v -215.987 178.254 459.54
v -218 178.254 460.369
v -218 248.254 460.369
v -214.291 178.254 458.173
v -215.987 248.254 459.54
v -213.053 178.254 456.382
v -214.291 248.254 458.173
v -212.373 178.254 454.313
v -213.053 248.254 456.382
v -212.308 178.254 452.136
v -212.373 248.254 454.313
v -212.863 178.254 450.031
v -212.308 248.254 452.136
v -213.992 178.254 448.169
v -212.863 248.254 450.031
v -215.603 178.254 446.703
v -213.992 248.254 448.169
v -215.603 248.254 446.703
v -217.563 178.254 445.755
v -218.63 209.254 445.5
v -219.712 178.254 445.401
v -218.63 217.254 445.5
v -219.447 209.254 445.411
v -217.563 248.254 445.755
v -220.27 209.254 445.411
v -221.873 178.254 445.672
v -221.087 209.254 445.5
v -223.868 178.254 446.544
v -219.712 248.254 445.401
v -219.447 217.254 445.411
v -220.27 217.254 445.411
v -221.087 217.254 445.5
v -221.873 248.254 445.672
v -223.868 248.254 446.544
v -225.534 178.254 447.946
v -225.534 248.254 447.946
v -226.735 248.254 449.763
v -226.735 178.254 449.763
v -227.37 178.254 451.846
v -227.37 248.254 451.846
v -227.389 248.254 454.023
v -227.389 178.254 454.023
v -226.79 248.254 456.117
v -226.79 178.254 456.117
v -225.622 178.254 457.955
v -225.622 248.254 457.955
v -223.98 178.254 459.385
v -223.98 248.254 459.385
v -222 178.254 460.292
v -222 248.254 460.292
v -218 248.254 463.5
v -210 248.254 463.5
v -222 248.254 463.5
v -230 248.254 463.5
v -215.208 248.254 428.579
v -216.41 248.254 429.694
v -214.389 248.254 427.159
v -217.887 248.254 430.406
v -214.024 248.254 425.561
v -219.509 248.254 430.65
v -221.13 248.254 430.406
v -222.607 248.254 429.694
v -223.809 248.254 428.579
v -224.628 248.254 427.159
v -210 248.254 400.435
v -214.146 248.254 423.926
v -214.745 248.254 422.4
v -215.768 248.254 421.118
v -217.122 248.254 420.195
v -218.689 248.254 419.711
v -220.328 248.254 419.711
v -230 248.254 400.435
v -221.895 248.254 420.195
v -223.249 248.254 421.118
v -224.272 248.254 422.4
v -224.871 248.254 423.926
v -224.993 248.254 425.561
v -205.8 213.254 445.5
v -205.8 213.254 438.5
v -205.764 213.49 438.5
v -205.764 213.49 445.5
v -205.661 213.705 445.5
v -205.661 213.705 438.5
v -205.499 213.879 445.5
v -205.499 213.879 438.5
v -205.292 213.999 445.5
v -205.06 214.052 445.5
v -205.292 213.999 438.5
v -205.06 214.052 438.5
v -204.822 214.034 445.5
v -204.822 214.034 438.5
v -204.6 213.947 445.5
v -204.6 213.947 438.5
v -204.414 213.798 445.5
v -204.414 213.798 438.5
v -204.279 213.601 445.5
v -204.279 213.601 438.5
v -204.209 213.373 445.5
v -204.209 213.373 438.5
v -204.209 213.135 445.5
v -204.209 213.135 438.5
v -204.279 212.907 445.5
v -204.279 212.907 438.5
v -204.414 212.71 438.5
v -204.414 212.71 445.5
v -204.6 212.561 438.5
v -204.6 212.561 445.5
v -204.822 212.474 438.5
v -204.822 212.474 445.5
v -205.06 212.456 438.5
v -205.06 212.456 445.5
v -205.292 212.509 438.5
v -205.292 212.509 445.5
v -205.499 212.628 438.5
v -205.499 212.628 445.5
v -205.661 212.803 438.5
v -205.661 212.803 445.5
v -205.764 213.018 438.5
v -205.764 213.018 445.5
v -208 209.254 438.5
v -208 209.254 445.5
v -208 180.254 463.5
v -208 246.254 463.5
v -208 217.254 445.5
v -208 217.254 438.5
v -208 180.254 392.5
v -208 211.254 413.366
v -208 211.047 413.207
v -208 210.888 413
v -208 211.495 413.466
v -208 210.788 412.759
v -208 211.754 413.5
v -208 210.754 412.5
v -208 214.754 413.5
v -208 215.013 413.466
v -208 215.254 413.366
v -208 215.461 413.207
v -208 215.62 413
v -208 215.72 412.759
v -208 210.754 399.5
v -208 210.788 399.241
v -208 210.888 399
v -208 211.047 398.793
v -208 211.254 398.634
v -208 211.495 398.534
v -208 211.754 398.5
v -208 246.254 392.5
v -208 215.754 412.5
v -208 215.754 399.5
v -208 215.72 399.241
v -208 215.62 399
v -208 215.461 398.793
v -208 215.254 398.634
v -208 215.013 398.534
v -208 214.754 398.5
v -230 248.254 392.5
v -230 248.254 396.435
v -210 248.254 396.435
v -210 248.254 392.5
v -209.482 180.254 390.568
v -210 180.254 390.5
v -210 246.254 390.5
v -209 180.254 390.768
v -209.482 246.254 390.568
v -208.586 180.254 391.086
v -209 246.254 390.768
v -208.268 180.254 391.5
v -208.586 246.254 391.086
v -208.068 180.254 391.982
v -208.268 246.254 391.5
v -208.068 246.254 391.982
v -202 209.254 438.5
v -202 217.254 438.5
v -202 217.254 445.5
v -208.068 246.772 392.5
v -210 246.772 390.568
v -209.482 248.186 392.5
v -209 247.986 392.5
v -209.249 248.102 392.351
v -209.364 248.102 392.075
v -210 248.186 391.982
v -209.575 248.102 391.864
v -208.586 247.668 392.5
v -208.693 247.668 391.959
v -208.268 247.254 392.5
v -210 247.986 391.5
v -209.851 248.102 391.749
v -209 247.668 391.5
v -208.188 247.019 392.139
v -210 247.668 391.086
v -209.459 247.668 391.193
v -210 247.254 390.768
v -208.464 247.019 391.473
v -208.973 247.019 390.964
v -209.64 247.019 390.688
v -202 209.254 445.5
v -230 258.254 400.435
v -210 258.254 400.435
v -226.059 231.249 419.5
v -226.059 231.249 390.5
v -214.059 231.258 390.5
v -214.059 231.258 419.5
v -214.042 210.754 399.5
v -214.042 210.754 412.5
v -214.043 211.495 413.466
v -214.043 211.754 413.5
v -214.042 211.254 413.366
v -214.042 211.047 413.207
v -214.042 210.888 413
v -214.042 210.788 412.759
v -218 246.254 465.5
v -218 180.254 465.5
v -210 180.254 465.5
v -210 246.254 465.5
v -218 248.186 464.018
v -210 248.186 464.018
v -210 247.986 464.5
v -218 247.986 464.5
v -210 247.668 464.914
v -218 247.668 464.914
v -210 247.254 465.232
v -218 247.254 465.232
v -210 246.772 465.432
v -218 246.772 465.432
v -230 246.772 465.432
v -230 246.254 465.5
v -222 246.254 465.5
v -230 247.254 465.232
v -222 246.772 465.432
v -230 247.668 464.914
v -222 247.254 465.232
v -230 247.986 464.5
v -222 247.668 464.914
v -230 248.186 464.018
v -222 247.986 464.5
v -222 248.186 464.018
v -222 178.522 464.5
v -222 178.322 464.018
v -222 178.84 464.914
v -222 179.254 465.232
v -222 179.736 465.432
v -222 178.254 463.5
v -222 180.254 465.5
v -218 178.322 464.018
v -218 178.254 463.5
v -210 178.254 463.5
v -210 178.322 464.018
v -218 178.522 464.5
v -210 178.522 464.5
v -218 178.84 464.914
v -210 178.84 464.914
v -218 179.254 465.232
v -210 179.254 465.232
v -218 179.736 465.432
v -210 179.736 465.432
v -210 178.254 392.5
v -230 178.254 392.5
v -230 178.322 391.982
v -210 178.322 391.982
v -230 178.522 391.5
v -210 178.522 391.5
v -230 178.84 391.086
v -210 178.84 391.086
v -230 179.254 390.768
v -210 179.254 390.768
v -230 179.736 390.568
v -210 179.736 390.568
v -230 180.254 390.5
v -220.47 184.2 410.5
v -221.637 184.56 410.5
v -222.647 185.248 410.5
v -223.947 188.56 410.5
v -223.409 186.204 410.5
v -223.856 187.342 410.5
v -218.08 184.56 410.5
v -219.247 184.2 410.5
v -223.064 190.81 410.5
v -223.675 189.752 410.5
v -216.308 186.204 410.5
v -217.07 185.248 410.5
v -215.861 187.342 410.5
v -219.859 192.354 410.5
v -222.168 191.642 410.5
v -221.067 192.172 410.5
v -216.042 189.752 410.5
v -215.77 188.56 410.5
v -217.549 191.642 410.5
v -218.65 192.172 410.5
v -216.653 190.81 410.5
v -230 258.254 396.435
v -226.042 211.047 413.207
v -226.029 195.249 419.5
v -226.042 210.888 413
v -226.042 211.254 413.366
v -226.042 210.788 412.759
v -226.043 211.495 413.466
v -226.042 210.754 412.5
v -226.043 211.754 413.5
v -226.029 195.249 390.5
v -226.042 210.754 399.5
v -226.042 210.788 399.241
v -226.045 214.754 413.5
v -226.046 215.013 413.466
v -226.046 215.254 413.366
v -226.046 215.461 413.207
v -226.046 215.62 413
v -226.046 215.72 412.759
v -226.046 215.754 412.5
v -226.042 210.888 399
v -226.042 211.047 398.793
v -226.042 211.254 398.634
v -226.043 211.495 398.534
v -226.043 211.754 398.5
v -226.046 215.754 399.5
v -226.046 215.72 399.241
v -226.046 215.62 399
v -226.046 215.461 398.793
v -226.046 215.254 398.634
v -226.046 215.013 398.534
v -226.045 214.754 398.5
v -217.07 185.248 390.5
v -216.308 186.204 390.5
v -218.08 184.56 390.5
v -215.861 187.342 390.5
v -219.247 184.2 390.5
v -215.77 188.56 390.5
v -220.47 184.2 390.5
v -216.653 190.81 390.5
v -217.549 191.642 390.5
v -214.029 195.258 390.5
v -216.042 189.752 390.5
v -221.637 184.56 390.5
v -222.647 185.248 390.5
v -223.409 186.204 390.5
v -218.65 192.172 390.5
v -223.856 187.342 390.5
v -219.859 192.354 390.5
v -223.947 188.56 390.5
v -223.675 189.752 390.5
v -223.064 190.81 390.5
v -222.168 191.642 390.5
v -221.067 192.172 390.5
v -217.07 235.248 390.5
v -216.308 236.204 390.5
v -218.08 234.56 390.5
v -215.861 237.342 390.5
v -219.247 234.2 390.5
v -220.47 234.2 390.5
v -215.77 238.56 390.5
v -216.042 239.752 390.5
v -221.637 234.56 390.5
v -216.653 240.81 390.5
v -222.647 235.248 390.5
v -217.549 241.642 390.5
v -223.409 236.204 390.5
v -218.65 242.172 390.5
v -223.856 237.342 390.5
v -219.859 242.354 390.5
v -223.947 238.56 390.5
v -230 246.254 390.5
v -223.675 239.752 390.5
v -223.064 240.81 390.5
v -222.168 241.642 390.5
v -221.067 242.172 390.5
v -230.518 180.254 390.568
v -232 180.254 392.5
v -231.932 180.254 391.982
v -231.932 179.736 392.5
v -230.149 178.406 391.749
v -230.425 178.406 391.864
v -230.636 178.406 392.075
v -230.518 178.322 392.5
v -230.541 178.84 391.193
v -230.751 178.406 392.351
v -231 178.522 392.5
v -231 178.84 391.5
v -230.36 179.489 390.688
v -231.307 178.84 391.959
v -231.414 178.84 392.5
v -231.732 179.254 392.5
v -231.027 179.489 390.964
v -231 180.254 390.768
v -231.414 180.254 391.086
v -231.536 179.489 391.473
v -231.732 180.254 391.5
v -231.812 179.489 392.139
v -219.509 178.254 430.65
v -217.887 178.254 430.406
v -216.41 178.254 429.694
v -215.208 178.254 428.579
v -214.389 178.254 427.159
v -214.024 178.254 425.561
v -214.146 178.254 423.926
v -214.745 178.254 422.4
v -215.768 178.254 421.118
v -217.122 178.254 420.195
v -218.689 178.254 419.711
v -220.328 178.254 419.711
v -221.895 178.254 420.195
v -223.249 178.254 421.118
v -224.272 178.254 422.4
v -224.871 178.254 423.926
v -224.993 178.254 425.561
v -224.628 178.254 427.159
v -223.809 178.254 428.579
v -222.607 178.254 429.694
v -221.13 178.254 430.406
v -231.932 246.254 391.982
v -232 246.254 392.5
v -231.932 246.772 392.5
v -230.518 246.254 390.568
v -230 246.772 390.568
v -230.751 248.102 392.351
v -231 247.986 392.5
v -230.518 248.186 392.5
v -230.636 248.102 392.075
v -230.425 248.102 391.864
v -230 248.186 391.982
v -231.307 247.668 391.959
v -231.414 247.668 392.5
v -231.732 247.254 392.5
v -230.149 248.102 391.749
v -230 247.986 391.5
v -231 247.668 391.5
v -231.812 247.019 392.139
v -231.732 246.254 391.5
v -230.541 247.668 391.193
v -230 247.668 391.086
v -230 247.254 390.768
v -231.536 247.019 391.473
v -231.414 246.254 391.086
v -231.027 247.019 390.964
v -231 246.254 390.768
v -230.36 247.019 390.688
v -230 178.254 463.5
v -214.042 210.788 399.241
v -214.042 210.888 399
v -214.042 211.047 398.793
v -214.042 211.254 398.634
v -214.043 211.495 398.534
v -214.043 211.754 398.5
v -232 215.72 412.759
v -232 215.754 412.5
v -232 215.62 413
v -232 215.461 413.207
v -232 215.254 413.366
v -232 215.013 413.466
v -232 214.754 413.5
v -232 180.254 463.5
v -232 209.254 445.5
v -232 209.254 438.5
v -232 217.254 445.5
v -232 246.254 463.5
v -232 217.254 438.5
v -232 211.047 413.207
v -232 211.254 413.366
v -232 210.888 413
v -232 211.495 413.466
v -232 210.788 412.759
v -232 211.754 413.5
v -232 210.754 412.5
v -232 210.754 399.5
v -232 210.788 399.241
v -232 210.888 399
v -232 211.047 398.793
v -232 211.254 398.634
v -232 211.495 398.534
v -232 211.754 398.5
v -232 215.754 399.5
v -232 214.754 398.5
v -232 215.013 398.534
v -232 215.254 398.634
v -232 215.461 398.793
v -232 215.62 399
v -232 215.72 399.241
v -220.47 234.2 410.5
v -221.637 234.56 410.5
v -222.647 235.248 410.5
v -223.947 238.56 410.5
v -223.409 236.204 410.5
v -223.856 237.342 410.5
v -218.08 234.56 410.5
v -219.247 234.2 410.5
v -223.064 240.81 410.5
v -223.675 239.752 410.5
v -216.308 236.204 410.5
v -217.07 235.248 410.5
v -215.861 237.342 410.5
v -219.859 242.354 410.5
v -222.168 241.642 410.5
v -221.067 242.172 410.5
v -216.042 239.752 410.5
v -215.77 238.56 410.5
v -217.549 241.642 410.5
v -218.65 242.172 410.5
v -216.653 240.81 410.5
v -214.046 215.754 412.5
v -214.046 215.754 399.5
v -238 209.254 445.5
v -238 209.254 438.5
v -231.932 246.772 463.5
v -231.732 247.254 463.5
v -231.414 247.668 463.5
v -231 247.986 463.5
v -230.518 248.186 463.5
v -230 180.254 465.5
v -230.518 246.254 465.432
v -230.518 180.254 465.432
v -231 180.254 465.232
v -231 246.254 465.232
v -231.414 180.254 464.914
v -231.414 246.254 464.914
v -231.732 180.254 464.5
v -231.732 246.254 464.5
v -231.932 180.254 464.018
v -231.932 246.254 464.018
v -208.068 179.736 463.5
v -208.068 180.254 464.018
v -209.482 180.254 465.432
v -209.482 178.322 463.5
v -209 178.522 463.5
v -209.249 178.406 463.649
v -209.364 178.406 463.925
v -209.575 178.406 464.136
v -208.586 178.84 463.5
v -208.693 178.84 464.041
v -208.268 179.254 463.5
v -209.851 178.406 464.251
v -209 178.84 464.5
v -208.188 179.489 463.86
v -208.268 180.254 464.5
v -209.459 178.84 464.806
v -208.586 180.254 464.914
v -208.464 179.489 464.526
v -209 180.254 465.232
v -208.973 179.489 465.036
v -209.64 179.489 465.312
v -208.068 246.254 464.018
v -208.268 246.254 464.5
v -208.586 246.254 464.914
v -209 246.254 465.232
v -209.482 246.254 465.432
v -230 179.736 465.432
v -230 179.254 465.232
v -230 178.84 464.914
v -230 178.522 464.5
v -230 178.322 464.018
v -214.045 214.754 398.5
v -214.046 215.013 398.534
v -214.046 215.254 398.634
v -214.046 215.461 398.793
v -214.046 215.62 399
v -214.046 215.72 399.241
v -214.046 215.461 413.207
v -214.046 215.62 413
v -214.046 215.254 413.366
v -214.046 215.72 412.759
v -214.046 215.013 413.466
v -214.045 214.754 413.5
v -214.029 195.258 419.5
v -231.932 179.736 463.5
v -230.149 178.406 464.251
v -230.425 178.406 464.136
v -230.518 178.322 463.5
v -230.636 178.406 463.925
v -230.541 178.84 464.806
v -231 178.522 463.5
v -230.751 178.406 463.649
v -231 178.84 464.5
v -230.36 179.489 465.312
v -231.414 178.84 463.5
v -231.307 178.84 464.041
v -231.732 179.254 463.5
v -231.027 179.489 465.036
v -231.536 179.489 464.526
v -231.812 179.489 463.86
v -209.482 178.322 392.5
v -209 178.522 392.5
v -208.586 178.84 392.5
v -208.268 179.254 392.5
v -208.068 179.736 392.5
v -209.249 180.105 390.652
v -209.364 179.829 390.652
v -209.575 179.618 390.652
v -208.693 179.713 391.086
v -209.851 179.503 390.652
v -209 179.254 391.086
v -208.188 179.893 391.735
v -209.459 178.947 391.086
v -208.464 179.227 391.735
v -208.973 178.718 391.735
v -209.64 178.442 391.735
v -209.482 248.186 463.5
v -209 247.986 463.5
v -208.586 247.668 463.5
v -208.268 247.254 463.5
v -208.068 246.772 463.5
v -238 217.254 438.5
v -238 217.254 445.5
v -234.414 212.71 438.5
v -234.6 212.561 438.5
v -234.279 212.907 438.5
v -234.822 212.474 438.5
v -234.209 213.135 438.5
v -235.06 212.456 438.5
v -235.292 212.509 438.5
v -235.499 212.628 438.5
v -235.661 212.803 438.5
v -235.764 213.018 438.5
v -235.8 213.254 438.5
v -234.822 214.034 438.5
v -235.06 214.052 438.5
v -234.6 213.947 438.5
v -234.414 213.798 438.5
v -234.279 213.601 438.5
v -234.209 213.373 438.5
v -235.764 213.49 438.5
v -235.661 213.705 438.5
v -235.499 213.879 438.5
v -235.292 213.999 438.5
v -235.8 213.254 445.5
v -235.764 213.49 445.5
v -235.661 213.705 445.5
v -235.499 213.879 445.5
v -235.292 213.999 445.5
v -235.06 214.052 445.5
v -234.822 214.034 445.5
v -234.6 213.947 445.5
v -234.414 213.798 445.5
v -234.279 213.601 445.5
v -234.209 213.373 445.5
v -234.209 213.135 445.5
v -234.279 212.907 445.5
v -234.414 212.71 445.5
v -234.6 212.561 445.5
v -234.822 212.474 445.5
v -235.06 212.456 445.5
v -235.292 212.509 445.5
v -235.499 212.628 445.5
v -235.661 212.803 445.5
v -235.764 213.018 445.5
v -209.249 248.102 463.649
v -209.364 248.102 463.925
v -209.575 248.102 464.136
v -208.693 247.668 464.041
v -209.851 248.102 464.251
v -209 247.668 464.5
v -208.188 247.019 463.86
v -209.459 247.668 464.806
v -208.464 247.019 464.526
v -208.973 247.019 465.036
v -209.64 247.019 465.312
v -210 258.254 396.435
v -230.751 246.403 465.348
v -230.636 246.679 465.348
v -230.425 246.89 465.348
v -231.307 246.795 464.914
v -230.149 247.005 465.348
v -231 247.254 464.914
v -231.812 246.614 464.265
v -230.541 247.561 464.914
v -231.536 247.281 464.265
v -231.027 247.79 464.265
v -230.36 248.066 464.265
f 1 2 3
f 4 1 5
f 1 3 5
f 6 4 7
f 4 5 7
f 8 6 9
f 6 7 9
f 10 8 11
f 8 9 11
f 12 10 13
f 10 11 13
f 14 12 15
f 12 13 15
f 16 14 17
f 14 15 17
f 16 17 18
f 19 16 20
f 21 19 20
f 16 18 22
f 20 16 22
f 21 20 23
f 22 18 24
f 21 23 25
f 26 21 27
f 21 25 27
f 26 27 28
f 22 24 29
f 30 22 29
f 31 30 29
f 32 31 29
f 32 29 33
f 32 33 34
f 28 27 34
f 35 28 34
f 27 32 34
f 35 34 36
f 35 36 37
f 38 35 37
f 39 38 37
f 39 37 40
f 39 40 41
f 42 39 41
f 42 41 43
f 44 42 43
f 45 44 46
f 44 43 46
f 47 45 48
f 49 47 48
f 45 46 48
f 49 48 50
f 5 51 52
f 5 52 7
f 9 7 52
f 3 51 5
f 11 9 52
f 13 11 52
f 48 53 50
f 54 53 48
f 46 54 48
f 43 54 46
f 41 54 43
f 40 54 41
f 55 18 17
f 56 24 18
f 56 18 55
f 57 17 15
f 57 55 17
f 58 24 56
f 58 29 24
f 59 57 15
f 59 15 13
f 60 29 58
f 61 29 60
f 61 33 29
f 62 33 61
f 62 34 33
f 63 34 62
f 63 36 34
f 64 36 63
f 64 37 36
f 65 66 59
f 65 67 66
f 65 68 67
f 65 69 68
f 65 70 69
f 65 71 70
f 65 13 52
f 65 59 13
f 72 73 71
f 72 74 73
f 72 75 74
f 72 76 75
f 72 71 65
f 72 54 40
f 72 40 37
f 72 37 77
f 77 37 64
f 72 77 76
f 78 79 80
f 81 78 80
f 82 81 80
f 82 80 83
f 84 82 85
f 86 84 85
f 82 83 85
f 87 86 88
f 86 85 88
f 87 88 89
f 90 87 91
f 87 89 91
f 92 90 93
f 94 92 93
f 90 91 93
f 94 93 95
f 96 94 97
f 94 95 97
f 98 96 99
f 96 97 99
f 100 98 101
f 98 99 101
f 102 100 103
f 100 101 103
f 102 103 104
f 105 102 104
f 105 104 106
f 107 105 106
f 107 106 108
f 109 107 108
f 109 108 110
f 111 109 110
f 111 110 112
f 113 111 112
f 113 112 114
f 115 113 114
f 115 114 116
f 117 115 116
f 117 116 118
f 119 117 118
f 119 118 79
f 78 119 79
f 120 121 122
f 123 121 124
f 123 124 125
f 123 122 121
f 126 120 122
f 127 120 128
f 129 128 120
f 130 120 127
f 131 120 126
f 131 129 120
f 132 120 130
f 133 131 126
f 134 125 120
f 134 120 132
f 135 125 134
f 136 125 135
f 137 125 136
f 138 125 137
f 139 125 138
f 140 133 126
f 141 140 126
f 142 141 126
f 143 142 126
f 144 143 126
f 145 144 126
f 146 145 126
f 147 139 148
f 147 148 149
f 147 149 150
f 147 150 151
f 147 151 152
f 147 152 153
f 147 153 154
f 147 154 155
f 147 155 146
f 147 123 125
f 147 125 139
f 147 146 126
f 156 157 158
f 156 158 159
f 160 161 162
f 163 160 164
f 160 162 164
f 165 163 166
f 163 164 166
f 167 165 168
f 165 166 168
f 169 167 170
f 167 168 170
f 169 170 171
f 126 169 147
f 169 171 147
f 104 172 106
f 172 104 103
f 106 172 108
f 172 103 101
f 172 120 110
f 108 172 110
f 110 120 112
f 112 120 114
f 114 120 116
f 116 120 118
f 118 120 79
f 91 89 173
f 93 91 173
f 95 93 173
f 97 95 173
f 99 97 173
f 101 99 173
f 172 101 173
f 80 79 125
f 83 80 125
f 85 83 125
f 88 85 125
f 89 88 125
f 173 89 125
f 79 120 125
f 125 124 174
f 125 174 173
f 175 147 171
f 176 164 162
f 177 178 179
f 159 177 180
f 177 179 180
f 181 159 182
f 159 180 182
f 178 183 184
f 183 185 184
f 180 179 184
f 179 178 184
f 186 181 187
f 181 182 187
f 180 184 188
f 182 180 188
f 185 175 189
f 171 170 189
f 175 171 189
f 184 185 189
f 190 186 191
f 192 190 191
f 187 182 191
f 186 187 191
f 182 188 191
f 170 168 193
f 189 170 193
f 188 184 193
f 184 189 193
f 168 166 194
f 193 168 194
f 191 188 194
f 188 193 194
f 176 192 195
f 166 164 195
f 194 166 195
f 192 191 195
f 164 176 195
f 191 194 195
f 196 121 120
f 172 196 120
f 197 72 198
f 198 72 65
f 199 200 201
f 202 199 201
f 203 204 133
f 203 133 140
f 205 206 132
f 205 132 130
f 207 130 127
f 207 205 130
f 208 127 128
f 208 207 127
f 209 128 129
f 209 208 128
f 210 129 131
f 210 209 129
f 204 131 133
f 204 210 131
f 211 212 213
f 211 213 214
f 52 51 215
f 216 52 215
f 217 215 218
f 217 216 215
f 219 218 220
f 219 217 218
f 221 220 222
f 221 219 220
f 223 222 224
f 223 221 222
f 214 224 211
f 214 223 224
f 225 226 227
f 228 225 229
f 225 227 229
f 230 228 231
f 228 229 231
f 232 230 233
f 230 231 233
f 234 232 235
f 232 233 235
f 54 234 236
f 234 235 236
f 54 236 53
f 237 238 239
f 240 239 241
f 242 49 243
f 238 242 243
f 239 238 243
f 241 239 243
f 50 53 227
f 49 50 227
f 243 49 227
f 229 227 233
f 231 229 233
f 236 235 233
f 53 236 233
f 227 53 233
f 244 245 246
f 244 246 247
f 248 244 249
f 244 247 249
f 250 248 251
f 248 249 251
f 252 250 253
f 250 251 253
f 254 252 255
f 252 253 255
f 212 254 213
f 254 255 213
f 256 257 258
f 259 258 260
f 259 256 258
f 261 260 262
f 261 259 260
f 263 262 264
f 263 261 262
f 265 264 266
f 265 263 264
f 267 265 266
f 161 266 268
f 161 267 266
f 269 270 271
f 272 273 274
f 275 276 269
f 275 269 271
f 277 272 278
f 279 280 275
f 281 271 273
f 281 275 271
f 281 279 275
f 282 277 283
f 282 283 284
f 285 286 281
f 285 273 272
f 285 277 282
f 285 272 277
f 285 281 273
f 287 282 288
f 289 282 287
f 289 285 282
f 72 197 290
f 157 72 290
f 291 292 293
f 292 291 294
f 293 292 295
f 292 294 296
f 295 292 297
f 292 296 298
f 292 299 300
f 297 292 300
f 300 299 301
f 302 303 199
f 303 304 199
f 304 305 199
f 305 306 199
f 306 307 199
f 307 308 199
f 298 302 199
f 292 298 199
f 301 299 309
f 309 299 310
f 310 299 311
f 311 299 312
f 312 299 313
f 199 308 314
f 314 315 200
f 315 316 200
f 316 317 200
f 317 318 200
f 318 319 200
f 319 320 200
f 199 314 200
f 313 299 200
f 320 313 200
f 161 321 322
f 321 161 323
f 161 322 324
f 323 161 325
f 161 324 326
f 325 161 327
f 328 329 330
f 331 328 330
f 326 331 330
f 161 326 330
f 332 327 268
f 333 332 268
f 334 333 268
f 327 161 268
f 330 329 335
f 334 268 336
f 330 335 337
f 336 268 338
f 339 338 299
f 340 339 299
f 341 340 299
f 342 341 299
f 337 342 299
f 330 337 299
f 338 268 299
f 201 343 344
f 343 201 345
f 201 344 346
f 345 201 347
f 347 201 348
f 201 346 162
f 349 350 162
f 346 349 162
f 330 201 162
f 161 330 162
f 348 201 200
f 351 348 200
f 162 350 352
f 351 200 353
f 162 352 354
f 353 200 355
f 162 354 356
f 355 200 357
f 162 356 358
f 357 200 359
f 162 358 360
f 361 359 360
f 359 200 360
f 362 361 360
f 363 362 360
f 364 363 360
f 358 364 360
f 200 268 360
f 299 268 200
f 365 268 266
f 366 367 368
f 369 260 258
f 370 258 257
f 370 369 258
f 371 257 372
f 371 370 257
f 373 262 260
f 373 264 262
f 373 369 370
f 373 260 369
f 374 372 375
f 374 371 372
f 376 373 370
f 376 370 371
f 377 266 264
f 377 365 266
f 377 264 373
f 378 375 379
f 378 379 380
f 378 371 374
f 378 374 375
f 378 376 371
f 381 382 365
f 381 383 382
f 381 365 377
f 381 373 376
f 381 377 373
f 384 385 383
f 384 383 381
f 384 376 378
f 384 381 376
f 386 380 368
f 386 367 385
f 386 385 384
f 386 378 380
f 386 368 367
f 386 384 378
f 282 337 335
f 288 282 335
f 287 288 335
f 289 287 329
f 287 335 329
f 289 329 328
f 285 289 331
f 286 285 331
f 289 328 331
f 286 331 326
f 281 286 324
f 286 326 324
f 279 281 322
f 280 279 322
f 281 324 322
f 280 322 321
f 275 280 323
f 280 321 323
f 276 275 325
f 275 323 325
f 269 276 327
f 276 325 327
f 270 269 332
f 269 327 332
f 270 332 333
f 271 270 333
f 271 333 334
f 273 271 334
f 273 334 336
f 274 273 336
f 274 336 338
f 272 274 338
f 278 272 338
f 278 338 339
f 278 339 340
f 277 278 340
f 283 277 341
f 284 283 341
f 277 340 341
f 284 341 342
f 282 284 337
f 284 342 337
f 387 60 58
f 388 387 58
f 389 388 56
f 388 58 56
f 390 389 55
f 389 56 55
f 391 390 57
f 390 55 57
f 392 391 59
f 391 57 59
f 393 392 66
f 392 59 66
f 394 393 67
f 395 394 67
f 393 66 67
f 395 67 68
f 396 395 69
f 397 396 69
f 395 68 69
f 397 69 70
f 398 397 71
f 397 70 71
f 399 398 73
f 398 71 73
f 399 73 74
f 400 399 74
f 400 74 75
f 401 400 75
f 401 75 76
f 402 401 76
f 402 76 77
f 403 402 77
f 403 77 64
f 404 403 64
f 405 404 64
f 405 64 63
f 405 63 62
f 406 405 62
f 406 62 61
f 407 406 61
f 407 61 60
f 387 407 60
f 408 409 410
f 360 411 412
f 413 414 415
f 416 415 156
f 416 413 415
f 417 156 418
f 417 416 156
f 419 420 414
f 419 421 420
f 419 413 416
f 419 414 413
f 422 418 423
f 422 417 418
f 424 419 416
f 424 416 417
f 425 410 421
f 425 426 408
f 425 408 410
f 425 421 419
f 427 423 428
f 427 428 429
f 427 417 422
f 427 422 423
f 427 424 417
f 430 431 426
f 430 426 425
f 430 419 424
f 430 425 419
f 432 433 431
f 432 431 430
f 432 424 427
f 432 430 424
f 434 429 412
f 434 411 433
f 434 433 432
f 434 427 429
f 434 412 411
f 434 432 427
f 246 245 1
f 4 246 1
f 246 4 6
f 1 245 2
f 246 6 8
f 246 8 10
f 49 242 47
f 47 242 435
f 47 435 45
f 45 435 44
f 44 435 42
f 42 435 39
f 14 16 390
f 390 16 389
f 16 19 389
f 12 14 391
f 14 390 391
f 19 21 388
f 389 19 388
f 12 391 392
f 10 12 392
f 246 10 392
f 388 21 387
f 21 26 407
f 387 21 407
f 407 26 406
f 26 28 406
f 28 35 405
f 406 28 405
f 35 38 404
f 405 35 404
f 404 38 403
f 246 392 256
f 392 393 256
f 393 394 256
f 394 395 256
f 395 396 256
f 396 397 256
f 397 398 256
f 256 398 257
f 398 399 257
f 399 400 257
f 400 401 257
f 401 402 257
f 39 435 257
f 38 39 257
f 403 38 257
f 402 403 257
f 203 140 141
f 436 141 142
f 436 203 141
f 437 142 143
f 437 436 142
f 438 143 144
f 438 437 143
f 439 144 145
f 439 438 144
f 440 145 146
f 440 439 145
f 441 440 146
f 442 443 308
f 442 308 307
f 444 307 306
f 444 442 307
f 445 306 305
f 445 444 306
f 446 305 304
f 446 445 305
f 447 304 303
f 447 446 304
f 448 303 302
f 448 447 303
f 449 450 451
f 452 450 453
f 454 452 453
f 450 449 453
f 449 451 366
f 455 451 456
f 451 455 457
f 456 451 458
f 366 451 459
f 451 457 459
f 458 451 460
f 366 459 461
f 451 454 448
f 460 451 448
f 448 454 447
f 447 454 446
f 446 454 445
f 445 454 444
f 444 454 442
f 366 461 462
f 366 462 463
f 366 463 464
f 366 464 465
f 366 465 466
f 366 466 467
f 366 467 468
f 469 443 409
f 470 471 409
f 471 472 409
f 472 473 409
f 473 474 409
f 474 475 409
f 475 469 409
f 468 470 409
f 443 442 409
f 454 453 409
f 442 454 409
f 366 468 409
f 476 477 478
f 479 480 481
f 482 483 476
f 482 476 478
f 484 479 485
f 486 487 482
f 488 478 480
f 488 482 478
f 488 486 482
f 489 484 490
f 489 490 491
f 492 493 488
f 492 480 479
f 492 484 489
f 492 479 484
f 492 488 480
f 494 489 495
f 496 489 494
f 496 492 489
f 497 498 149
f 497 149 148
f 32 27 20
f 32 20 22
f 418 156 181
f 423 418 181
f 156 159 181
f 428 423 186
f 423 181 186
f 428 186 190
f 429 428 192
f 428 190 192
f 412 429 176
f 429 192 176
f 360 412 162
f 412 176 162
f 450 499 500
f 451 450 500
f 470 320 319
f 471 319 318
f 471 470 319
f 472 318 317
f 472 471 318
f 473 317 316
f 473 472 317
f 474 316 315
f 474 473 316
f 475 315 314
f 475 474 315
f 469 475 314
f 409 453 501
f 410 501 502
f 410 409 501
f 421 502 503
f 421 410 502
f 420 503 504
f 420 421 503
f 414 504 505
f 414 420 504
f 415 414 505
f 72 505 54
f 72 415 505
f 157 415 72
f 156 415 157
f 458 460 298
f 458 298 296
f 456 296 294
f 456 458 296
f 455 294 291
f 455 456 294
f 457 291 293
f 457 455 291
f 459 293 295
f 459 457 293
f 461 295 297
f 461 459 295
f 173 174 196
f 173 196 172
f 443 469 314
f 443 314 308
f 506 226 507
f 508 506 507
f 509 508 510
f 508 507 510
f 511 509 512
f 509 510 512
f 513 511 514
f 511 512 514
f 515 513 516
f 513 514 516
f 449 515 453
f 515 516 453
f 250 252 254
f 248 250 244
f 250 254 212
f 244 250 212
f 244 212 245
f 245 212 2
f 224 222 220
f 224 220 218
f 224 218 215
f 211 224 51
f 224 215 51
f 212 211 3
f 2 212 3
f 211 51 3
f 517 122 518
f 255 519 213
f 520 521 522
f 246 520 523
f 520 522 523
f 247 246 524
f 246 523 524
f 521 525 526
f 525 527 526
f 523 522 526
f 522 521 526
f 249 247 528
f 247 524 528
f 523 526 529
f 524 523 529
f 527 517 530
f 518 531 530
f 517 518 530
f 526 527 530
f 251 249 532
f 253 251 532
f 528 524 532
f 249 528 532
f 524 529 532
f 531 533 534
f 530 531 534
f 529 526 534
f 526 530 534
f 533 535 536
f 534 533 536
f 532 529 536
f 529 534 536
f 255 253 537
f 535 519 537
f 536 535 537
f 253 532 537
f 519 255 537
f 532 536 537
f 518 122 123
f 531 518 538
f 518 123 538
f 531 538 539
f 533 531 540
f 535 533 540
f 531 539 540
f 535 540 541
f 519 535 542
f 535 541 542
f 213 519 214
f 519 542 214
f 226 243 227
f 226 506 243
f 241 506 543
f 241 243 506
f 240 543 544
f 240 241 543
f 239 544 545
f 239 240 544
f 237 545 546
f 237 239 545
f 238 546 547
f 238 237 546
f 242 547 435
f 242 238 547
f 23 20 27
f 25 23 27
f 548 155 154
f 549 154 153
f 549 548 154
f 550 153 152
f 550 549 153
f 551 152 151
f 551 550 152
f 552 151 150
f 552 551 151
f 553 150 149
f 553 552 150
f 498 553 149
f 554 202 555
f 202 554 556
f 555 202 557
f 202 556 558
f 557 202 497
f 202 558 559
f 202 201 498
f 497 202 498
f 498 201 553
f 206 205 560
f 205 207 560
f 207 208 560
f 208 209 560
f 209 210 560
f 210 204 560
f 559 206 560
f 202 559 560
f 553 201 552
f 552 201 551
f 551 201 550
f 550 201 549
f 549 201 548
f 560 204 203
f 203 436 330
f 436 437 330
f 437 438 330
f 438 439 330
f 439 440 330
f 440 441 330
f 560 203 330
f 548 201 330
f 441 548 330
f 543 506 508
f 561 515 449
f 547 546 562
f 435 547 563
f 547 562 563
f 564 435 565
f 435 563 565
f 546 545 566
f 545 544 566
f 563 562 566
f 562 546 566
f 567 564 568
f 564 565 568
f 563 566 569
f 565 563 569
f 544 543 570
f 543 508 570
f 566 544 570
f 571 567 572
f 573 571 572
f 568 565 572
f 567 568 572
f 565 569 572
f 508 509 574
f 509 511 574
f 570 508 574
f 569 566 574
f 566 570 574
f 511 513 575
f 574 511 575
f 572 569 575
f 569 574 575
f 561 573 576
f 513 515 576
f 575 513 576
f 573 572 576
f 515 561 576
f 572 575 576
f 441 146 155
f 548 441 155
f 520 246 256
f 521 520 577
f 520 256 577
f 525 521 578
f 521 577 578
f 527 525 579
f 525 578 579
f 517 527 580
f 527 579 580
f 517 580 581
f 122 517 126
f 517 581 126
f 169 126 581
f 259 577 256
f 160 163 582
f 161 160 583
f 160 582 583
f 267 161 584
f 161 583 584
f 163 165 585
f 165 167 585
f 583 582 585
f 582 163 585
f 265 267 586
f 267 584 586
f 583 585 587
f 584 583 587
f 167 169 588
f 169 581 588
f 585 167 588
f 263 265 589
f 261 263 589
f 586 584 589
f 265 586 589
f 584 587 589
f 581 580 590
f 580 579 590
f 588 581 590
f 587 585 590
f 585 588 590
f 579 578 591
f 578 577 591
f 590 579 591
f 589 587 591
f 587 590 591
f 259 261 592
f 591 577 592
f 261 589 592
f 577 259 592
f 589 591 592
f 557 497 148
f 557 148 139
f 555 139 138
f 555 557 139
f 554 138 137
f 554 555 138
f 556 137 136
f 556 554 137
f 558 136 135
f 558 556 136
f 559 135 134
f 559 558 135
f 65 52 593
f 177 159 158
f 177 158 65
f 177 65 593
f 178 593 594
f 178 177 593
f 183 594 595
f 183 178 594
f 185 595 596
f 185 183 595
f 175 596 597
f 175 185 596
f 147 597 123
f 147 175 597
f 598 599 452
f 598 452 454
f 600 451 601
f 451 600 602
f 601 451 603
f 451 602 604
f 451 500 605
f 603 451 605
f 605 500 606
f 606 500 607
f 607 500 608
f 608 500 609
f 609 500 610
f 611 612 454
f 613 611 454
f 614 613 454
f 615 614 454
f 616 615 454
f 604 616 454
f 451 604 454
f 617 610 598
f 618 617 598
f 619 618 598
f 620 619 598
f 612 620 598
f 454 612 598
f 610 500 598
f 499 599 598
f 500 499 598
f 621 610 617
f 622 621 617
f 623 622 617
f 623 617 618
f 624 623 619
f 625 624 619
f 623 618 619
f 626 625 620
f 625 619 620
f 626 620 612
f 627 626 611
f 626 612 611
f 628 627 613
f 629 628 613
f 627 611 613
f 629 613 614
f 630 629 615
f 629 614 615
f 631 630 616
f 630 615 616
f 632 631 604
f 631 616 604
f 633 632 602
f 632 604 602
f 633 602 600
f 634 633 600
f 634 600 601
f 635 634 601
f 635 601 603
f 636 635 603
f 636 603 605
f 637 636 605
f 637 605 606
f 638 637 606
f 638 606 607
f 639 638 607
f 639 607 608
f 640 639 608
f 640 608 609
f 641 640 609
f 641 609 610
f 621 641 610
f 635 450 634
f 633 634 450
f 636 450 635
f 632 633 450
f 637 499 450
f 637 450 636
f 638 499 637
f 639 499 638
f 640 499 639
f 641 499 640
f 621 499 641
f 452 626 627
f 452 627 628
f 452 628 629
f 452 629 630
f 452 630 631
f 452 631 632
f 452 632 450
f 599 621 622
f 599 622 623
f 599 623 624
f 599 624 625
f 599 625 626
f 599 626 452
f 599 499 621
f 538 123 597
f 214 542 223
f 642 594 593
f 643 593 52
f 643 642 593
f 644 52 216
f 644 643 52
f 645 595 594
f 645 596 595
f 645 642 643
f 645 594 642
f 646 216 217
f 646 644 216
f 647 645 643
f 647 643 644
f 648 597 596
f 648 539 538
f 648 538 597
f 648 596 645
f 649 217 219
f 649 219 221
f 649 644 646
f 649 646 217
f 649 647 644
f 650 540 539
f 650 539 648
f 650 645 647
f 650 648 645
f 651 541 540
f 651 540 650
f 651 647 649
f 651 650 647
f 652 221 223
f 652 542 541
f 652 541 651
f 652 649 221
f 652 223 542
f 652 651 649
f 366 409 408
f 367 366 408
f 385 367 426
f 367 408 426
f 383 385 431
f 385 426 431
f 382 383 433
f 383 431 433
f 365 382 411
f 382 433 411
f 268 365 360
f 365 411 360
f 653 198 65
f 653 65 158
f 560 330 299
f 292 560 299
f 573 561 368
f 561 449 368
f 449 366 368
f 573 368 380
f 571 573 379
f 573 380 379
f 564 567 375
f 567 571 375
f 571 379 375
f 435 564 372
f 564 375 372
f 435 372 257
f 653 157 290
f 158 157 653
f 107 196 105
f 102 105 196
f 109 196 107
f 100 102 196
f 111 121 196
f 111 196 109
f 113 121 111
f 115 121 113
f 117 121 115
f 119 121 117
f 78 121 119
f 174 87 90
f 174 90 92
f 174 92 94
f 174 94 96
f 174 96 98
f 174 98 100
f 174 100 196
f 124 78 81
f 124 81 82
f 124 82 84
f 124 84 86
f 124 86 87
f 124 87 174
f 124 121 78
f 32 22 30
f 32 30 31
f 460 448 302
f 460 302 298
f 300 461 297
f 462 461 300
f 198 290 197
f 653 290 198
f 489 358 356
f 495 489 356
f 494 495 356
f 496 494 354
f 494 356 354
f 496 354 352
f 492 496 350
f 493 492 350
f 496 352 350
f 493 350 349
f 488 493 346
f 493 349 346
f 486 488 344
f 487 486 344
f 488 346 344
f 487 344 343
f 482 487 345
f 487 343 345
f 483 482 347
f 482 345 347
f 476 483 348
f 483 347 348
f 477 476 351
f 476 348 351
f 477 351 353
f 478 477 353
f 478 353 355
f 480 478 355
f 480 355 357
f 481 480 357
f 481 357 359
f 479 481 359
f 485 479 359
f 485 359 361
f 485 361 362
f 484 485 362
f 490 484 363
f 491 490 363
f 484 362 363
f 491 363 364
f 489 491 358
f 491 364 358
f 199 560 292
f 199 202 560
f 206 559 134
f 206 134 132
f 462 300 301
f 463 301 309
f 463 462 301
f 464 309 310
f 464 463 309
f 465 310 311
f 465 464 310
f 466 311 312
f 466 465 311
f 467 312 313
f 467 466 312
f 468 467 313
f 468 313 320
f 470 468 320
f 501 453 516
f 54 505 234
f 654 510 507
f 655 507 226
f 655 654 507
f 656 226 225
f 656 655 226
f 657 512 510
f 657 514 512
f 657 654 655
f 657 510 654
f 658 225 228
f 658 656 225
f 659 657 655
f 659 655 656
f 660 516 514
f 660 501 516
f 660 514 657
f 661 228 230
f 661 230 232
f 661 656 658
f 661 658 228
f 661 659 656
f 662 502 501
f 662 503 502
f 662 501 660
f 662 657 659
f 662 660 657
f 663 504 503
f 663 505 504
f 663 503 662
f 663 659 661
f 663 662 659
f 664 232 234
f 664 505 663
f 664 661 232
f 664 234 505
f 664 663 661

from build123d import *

# Parameters (mm, degrees)
RESSALTO_EXTRUS_O1_DEPTH                   = 12
RESSALTO_EXTRUS_O1_DEPTH_BACK              = 12
ESBO_O1_W                                  = 75
ESBO_O1_H                                  = 70
ESBO_O3_R                                  = 5.5
CORTE_EXTRUS_O1_DEPTH                      = 525.799189678
ESBO_O4_R                                  = 4.1
CORTE_EXTRUS_O2_DEPTH                      = 20
FILETE1_R                                  = 2
CORTE_EXTRUS_O3_DEPTH                      = 29
CORTE_EXTRUS_O4_DEPTH                      = 28
RESSALTO_EXTRUS_O2_DEPTH                   = 6
RESSALTO_EXTRUS_O2_DEPTH_BACK              = 30
ESBO_O7_W                                  = 7
ESBO_O7_H                                  = 8
BROCA_DE_ROSQUEAR_PARA_TARRAXA_DE_M2X0_4_D = 1.6
BROCA_DE_ROSQUEAR_PARA_TARRAXA_DE_M2_2_D   = 1.6
ESBO_O18_W                                 = 20
ESBO_O18_H                                 = 4
RESSALTO_EXTRUS_O3_DEPTH                   = 10


with BuildPart() as part:
    # Esboço1 → Ressalto-extrusão1 (new, two sides: drawn at the far end of the back side and taken through both)
    with BuildSketch(Plane(origin=(-220, 0, 0), x_dir=(0, 0, -1), z_dir=(1, 0, 0)).offset(-RESSALTO_EXTRUS_O1_DEPTH_BACK)):
        with Locations((-427.999935002, 213.253952806)):
            Rectangle(ESBO_O1_W, ESBO_O1_H)
    extrude(amount=RESSALTO_EXTRUS_O1_DEPTH + RESSALTO_EXTRUS_O1_DEPTH_BACK)

    # Esboço3 → Corte-extrusão1 (cut, through all)
    with BuildSketch(Plane(origin=(0, 248.253952806, 0), x_dir=(1, 0, 0), z_dir=(0, 1, 0))):
        with Locations((-219.508549322, -425.149935105)):
            Circle(ESBO_O3_R)
        with BuildLine():
            Line((-220, -465.499935002), (-218, -465.499935002))
            Line((-218, -465.499935002), (-218, -460.369179456))
            ThreePointArc((-218, -460.369179456), (-219.711945476, -445.401349285), (-222, -460.292000844))
            Line((-222, -460.292000844), (-222, -465.499935002))
            Line((-222, -465.499935002), (-220, -465.499935002))
        make_face()
    extrude(amount=-CORTE_EXTRUS_O1_DEPTH, mode=Mode.SUBTRACT)

    # Esboço4 → Corte-extrusão2 (cut)
    with BuildSketch(Plane(origin=(0, 0, 390.499935002), x_dir=(-1, 0, 0), z_dir=(0, 0, -1))):
        with Locations((219.858557552, 238.253952806)):
            Circle(ESBO_O4_R)
        with Locations((219.858557552, 188.253952806)):
            Circle(ESBO_O4_R)
    extrude(amount=-CORTE_EXTRUS_O2_DEPTH, mode=Mode.SUBTRACT)

    # Filete1
    filete1_edges = [part.edges().sort_by_distance(p)[0] for p in [
        (-227, 178.253952806, 465.499935002),
        (-213, 178.253952806, 465.499935002),
        (-213, 248.253952806, 465.499935002),
        (-227, 248.253952806, 465.499935002),
        (-208, 178.253952806, 427.999935002),
        (-208, 248.253952806, 427.999935002),
        (-208, 213.253952806, 465.499935002),
        (-232, 178.253952806, 427.999935002),
        (-232, 213.253952806, 465.499935002),
        (-232, 248.253952806, 427.999935002),
        (-220, 248.253952806, 390.499935002),
        (-220, 178.253952806, 390.499935002),
        (-208, 213.253952806, 390.499935002),
        (-232, 213.253952806, 390.499935002),
    ]]
    fillet(filete1_edges, radius=FILETE1_R)

    # Esboço5 → Corte-extrusão3 (cut)
    with BuildSketch(Plane(origin=(0, 0, 390.499935002), x_dir=(-1, 0, 0), z_dir=(0, 0, -1))):
        Polygon((214.029355297, 195.258459884), (226.029351267, 195.248625677), (226.058853888, 231.248613588), (214.058857917, 231.258447795), align=None)
    extrude(amount=-CORTE_EXTRUS_O3_DEPTH, mode=Mode.SUBTRACT)

    # Esboço6 → Corte-extrusão4 (cut)
    with BuildSketch(Plane.ZY.offset(232)):
        with BuildLine():
            Line((399.499935002, 215.753952806), (412.499935002, 215.753952806))
            ThreePointArc((412.499935002, 215.753952806), (413.207041783, 215.461059587), (413.499935002, 214.753952806))
            Line((413.499935002, 214.753952806), (413.499935002, 211.753952806))
            ThreePointArc((413.499935002, 211.753952806), (413.207041783, 211.046846025), (412.499935002, 210.753952806))
            Line((412.499935002, 210.753952806), (399.499935002, 210.753952806))
            ThreePointArc((399.499935002, 210.753952806), (398.792828221, 211.046846025), (398.499935002, 211.753952806))
            Line((398.499935002, 211.753952806), (398.499935002, 214.753952806))
            ThreePointArc((398.499935002, 214.753952806), (398.792828221, 215.461059587), (399.499935002, 215.753952806))
        make_face()
    extrude(amount=-CORTE_EXTRUS_O4_DEPTH, mode=Mode.SUBTRACT)

    # Esboço7 → Ressalto-extrusão2 (add, two sides: drawn at the far end of the back side and taken through both)
    with BuildSketch(Plane(origin=(-208, 0, 0), x_dir=(0, 0, -1), z_dir=(1, 0, 0)).offset(-RESSALTO_EXTRUS_O2_DEPTH_BACK)):
        with Locations((-441.999935002, 213.253952806)):
            Rectangle(ESBO_O7_W, ESBO_O7_H)
    extrude(amount=RESSALTO_EXTRUS_O2_DEPTH + RESSALTO_EXTRUS_O2_DEPTH_BACK)

    # Broca de rosquear para tarraxa de M2x0.4 (through all)
    with Locations(Plane.XY.offset(445.499935002)):
        with Locations((-205, 213.253952806)):
            Hole(BROCA_DE_ROSQUEAR_PARA_TARRAXA_DE_M2X0_4_D / 2)

    # Broca de rosquear para tarraxa de M2 2 (through all)
    with Locations(Plane.XY.offset(445.499935002)):
        with Locations((-235, 213.253952806)):
            Hole(BROCA_DE_ROSQUEAR_PARA_TARRAXA_DE_M2_2_D / 2)

    # Esboço18 → Ressalto-extrusão3 (add)
    with BuildSketch(Plane(origin=(0, 248.253952806, 0), x_dir=(1, 0, 0), z_dir=(0, 1, 0))):
        with Locations((-220, -398.434558943)):
            Rectangle(ESBO_O18_W, ESBO_O18_H)
    extrude(amount=RESSALTO_EXTRUS_O3_DEPTH)


solid = part.part
